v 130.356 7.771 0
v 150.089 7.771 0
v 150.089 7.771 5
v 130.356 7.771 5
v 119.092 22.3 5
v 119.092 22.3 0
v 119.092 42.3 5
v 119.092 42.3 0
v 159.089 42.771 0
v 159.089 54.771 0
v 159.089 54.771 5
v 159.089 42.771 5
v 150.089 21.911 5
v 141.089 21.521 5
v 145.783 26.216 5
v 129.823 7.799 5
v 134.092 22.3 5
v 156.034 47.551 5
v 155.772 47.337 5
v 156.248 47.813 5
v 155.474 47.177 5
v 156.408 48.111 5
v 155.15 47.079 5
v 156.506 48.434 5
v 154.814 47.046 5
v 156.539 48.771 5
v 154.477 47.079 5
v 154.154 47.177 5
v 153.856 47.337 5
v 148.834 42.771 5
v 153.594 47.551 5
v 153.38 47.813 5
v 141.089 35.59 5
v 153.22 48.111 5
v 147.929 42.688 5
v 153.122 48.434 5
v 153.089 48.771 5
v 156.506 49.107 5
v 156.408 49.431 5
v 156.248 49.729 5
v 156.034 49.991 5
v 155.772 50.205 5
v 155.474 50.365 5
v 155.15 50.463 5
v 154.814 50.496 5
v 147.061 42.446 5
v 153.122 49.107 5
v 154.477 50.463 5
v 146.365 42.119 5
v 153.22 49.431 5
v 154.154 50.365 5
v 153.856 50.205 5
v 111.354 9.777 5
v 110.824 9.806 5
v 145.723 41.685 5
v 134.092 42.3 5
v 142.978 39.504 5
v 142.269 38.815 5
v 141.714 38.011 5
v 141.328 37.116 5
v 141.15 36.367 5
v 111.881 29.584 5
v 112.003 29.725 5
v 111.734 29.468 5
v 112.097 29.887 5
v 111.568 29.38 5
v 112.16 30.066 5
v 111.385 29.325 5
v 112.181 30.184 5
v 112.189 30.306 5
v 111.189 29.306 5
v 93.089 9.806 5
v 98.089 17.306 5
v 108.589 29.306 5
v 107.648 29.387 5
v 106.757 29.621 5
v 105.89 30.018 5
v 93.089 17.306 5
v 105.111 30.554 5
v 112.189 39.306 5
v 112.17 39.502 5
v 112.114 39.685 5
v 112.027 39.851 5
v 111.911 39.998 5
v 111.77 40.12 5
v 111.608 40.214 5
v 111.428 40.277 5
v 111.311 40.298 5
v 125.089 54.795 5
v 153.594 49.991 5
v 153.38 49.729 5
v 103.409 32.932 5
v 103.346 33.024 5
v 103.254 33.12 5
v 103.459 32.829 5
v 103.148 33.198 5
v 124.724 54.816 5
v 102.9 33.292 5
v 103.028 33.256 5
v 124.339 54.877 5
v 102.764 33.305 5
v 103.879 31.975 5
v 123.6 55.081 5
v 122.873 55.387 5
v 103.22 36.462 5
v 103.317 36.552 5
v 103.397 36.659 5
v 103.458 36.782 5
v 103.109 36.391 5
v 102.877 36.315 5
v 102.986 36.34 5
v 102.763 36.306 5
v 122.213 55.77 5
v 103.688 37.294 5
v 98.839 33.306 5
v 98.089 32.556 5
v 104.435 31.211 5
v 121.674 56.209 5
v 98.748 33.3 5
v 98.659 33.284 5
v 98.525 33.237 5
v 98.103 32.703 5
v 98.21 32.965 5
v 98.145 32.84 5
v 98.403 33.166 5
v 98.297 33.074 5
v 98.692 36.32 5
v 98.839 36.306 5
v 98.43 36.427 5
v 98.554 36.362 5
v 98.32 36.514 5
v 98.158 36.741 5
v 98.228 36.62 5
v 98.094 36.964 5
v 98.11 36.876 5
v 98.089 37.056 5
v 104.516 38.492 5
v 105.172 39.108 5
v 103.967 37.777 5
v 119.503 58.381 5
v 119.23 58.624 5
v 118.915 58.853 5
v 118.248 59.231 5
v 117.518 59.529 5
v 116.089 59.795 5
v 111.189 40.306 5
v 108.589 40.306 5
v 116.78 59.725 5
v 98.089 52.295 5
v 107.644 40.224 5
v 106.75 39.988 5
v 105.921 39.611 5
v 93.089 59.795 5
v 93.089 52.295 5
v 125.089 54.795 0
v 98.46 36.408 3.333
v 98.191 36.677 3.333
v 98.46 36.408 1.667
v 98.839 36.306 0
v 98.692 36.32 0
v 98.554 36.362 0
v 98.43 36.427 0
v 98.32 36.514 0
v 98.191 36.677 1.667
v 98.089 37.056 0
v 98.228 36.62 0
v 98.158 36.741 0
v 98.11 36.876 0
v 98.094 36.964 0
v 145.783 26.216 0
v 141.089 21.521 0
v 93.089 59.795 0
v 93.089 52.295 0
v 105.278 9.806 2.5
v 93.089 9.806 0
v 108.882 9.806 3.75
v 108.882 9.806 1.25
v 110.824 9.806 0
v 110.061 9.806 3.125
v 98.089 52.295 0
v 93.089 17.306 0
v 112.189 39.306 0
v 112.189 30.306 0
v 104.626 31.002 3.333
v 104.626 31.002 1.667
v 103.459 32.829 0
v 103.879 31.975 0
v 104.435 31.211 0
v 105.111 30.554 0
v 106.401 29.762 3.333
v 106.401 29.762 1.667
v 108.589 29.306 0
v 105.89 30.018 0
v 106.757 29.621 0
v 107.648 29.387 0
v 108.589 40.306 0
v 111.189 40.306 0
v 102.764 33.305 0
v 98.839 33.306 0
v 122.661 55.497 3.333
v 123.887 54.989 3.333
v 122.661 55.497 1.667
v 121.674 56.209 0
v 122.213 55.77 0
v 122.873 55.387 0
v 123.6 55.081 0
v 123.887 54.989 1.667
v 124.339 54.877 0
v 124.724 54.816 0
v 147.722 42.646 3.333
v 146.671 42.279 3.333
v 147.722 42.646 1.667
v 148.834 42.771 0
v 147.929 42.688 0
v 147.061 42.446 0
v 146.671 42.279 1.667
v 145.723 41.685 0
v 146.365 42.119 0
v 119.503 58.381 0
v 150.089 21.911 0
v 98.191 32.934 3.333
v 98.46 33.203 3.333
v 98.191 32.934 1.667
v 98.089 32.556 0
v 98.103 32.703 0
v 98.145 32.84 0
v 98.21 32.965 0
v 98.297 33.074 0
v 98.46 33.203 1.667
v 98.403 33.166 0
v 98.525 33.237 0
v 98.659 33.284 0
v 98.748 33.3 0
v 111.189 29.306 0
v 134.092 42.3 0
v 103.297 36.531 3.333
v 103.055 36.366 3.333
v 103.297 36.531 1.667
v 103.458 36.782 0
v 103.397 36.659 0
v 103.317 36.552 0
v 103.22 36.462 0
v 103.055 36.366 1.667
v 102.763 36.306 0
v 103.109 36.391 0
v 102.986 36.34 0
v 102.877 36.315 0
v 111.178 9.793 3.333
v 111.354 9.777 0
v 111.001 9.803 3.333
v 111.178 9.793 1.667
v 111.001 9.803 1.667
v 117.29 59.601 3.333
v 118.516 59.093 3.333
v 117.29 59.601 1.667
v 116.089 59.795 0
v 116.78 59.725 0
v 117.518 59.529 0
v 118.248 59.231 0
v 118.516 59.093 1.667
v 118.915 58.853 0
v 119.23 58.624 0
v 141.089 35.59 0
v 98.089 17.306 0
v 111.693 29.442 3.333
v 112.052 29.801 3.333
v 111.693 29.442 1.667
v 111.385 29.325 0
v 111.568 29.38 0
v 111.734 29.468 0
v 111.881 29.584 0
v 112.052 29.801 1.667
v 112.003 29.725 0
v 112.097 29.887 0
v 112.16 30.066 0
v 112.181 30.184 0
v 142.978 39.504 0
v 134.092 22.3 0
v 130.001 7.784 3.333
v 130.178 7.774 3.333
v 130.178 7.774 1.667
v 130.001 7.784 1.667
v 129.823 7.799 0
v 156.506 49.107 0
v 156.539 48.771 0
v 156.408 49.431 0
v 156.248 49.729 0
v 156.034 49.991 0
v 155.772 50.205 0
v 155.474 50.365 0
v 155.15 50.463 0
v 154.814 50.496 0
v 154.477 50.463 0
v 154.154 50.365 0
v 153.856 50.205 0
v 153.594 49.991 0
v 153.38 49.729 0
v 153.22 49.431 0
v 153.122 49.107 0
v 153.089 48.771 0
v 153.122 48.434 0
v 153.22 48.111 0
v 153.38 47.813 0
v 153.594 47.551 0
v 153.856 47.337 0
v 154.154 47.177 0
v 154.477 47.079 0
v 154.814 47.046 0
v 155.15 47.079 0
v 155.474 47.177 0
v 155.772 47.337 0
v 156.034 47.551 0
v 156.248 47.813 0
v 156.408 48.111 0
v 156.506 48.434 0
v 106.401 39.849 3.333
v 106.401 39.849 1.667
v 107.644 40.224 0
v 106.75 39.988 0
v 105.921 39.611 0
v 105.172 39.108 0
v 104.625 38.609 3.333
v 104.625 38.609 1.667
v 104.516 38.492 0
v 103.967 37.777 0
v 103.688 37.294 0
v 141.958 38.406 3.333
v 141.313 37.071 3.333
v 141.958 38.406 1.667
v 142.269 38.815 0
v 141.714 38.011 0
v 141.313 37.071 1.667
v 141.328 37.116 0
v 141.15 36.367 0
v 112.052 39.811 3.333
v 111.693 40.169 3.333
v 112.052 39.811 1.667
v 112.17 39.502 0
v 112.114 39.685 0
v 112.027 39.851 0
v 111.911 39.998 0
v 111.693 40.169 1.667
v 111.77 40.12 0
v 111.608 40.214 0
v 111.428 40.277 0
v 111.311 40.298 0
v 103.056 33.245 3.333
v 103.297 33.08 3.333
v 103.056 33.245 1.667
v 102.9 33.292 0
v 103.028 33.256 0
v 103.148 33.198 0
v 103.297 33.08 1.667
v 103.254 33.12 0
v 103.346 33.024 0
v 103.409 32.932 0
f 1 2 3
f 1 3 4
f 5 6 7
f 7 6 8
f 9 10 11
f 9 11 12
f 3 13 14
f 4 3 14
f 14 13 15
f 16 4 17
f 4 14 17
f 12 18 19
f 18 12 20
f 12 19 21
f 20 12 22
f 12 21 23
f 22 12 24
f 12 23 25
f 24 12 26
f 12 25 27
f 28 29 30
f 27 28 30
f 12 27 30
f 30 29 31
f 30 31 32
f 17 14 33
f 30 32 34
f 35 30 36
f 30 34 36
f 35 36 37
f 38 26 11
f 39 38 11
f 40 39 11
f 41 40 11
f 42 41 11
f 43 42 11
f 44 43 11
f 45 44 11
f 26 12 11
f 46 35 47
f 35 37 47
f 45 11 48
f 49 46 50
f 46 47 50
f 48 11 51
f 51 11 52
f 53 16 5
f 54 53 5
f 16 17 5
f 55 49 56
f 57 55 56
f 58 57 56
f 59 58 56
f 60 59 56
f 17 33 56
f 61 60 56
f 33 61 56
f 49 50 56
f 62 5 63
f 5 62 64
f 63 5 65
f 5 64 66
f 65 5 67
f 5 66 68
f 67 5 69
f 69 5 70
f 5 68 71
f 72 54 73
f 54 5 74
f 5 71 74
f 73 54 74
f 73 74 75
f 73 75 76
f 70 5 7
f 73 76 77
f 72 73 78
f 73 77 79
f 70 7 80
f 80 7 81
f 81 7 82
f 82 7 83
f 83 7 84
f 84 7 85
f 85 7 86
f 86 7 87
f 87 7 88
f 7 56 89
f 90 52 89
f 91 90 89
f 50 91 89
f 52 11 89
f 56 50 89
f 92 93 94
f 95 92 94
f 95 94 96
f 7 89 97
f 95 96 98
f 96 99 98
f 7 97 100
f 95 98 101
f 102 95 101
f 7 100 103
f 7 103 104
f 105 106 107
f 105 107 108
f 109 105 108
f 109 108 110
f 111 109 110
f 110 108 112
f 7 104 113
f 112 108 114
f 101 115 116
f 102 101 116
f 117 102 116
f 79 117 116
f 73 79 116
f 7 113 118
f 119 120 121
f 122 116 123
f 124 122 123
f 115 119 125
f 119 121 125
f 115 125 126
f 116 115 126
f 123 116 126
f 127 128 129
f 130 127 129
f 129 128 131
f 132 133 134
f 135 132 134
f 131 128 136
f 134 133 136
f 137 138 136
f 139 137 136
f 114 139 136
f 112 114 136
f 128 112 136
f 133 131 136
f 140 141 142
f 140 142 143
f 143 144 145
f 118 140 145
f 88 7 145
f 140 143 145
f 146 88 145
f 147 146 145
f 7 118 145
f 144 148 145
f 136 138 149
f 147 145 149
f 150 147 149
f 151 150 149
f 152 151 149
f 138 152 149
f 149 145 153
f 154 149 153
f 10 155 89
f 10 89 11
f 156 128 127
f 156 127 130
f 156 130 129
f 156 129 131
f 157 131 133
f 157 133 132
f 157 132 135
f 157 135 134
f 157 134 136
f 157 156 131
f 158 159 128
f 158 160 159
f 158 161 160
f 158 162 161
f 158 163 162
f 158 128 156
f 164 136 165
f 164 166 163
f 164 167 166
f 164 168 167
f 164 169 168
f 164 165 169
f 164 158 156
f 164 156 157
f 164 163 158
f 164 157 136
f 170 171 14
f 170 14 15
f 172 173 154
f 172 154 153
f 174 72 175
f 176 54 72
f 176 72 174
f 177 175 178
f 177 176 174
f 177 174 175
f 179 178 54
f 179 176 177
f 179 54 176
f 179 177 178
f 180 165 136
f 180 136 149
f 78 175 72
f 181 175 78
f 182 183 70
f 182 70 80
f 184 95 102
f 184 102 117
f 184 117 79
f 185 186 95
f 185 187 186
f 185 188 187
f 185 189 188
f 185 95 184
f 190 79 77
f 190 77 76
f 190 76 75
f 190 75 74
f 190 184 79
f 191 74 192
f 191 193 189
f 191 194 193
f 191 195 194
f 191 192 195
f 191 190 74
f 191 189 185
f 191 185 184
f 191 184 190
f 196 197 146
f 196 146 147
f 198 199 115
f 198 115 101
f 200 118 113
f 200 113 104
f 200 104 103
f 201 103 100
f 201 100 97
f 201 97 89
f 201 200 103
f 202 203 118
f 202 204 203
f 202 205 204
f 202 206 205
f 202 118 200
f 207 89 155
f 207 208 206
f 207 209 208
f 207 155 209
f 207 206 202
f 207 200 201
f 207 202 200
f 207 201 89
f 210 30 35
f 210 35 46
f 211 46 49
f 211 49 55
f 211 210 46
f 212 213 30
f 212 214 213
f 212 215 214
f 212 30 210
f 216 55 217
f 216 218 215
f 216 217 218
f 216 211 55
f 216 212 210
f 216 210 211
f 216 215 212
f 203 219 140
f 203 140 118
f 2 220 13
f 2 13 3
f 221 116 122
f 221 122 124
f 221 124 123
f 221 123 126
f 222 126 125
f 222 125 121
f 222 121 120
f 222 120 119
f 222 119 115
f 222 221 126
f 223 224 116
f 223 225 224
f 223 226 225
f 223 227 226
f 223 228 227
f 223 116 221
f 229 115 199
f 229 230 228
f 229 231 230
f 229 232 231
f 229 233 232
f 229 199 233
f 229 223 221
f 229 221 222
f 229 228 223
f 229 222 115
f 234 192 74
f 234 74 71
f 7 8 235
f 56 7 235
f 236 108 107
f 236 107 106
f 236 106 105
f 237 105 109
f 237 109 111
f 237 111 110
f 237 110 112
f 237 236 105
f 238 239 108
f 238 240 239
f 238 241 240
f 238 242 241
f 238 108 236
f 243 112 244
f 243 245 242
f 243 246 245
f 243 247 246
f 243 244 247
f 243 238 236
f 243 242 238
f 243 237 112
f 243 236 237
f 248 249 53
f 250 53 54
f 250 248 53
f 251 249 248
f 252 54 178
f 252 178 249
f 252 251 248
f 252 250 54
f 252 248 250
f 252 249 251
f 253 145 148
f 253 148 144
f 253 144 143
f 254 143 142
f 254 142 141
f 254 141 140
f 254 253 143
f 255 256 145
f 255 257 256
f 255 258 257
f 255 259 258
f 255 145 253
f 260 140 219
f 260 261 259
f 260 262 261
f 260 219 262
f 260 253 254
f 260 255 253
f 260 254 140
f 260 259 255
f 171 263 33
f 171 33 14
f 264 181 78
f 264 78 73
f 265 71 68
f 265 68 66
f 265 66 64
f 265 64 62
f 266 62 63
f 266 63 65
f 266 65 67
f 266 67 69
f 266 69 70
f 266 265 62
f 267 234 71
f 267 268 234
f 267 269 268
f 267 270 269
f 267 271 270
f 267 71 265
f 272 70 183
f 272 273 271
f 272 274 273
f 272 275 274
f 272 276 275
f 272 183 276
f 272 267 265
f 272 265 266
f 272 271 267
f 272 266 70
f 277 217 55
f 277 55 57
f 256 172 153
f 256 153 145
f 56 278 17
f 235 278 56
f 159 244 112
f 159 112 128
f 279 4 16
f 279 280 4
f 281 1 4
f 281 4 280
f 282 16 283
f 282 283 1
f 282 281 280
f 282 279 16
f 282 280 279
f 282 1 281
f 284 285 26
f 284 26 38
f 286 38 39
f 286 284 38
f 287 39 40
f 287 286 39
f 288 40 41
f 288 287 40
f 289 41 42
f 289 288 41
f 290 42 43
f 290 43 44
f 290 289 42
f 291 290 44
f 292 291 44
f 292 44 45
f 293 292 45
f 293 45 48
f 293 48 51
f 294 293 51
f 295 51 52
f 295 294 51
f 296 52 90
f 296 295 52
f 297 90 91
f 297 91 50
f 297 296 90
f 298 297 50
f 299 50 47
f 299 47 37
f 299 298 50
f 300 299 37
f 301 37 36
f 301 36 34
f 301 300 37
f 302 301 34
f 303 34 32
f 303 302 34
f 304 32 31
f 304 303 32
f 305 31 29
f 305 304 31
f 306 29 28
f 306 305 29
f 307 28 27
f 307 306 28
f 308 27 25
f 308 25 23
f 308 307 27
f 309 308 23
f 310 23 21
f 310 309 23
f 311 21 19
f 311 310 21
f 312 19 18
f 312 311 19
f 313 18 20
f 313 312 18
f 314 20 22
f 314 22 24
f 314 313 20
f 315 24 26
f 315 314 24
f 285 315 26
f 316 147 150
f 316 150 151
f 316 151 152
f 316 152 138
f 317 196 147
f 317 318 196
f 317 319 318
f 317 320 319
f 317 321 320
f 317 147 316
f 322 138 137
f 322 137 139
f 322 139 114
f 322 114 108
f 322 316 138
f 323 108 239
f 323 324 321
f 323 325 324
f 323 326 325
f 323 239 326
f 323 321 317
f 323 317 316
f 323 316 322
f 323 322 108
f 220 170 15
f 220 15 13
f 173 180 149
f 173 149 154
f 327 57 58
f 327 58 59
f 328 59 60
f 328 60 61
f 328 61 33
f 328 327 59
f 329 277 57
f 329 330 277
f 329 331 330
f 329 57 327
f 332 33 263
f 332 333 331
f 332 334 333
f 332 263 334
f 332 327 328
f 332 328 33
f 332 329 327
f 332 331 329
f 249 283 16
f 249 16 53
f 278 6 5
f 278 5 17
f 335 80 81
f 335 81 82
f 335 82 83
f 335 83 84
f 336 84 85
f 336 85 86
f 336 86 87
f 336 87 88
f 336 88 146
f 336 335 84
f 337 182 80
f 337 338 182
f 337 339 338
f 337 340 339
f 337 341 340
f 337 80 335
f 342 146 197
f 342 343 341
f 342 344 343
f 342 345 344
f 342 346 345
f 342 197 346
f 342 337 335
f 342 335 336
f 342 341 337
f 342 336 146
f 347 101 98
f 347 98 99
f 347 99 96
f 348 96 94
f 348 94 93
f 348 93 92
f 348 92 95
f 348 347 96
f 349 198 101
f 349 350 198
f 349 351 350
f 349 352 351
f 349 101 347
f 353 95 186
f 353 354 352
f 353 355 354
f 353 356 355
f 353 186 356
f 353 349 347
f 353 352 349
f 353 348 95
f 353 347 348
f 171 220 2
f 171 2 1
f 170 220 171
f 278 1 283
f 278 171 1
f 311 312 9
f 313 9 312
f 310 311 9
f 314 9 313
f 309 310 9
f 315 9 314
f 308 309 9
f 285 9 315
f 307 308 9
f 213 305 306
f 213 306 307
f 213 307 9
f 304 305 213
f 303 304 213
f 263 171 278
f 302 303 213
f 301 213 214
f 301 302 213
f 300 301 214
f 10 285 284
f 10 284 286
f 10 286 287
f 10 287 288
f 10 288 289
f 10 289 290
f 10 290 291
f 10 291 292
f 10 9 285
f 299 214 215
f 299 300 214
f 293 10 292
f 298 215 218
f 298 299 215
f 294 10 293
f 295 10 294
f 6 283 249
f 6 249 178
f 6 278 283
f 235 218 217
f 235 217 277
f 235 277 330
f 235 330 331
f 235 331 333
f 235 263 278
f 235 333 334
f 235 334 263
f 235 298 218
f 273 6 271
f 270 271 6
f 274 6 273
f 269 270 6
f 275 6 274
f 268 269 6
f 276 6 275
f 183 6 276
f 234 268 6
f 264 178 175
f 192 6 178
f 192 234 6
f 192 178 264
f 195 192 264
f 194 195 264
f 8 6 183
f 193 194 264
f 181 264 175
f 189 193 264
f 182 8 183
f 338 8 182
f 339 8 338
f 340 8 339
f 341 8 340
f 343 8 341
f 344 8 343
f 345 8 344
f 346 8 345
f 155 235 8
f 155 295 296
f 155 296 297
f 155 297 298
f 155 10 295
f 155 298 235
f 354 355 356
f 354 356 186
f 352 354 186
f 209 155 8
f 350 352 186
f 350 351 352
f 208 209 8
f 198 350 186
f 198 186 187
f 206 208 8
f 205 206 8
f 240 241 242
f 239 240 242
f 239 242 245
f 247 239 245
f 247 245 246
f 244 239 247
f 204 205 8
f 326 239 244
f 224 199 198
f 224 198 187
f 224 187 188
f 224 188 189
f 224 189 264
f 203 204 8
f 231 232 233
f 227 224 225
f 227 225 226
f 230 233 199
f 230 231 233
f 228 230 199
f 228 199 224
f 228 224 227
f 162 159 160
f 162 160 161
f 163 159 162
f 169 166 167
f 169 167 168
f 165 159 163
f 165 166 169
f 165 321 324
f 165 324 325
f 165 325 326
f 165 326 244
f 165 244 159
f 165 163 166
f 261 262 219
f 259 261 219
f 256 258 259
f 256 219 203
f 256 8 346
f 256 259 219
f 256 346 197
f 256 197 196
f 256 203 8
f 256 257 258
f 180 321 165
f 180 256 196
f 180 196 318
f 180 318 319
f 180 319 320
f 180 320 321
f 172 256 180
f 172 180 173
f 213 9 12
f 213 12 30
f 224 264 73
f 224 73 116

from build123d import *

# Parameters (mm, degrees)
MODEL_4_W           = 14.999999996
MODEL_4_H           = 19.999999994
MODEL_4_R           = 1.725
BOSS_EXTRUDE3_DEPTH = 5


with BuildPart() as part:
    # Model<4> → Boss-Extrude3 (new body)
    with BuildSketch(Plane.XY):
        with BuildLine():
            Line((159.088901233, 42.770886007), (159.088901233, 54.770886004))
            Line((159.088901233, 54.770886004), (125.08858378, 54.795139347))
            add(Edge.make_bspline(
                [(121.67437012, 56.209353091), (122.452187569, 55.431535532), (123.988583716, 54.795139347), (125.08858378, 54.795139347)],
                knots=[36, 36, 36, 36, 37, 37, 37, 37], degree=3))
            Line((121.67437012, 56.209353091), (119.502797904, 58.380925601))
            add(Edge.make_bspline(
                [(116.088583489, 59.795139659), (117.188583796, 59.795139659), (118.724980283, 59.158743333), (119.502797904, 58.380925601)],
                knots=[34, 34, 34, 34, 35, 35, 35, 35], degree=3))
            Line((116.088583489, 59.795139659), (93.088622023, 59.795139659))
            Line((93.088622023, 59.795139659), (93.088622023, 52.295139183))
            Line((93.088622023, 52.295139183), (98.088808744, 52.295139183))
            Line((98.088808744, 52.295139183), (98.088808744, 37.055828853))
            add(Edge.make_bspline(
                [(98.838842522, 36.30582961), (98.424615889, 36.305810532), (98.088808739, 36.64160222), (98.088808744, 37.055828853)],
                knots=[29, 29, 29, 29, 30, 30, 30, 30], degree=3))
            Line((98.838842522, 36.30582961), (102.763213768, 36.306010412))
            add(Edge.make_bspline(
                [(103.458228599, 36.781634874), (103.346863397, 36.494660115), (103.071039563, 36.306024593), (102.763213768, 36.306010412)],
                knots=[27, 27, 27, 27, 28, 28, 28, 28], degree=3))
            add(Edge.make_bspline(
                [(108.589100574, 40.305794491), (106.259590893, 40.305794491), (104.256249253, 38.838038305), (103.458228599, 36.781634874)],
                knots=[26, 26, 26, 26, 27, 27, 27, 27], degree=3))
            Line((108.589100574, 40.305794491), (111.188773507, 40.305794491))
            add(Edge.make_bspline(
                [(112.188773507, 39.305794492), (112.188773506, 39.858079241), (111.741058256, 40.305794491), (111.188773507, 40.305794491)],
                knots=[24, 24, 24, 24, 25, 25, 25, 25], degree=3))
            Line((112.188773507, 39.305794492), (112.188773507, 30.305794494))
            add(Edge.make_bspline(
                [(111.188773507, 29.305794495), (111.741058256, 29.305794495), (112.188773507, 29.753509745), (112.188773507, 30.305794494)],
                knots=[22, 22, 22, 22, 23, 23, 23, 23], degree=3))
            Line((111.188773507, 29.305794495), (108.589100574, 29.305794495))
            add(Edge.make_bspline(
                [(103.458534777, 32.829165314), (104.256761577, 30.773175353), (106.259888758, 29.305794495), (108.589100574, 29.305794495)],
                knots=[20, 20, 20, 20, 21, 21, 21, 21], degree=3))
            add(Edge.make_bspline(
                [(102.763713878, 33.304665432), (103.071437534, 33.304591066), (103.347162069, 33.116027604), (103.458534777, 32.829165314)],
                knots=[19, 19, 19, 19, 20, 20, 20, 20], degree=3))
            Line((102.763713878, 33.304665432), (98.838989216, 33.305613899))
            add(Edge.make_bspline(
                [(98.088808744, 32.555614676), (98.088808739, 32.969898599), (98.424705306, 33.30571401), (98.838989216, 33.305613899)],
                knots=[17, 17, 17, 17, 18, 18, 18, 18], degree=3))
            Line((98.088808744, 32.555614676), (98.088808744, 17.30579417))
            Line((98.088808744, 17.30579417), (93.088622023, 17.30579417))
            Line((93.088622023, 17.30579417), (93.088622023, 9.805793695))
            add(Edge.make_bspline(
                [(110.8243856, 9.805786903), (108.600397254, 9.805793694), (93.088622023, 9.805793695)],
                knots=[13, 13, 13, 14, 14, 14], degree=2))
            add(Edge.make_bspline(
                [(111.354083681, 9.777355295), (111.177236079, 9.796295653), (111.002244565, 9.80578636), (110.8243856, 9.805786903)],
                knots=[12, 12, 12, 12, 13, 13, 13, 13], degree=3))
            Line((111.354083681, 9.777355295), (129.823433077, 7.799317277))
            add(Edge.make_bspline(
                [(130.355887494, 7.770885671), (130.178023326, 7.770885671), (130.000285852, 7.780376365), (129.823433077, 7.799317277)],
                knots=[10, 10, 10, 10, 11, 11, 11, 11], degree=3))
            Line((130.355887494, 7.770885671), (150.088901196, 7.770885671))
            Line((150.088901196, 7.770885671), (150.088901196, 21.91055044))
            Line((150.088901196, 21.91055044), (145.783498532, 26.215953035))
            Line((145.783498532, 26.215953035), (141.088901059, 21.521355488))
            Line((141.088901059, 21.521355488), (141.088901059, 35.589646165))
            add(Edge.make_bspline(
                [(142.978129629, 39.504119451), (141.78451535, 38.555572629), (141.088901059, 37.114262879), (141.088901059, 35.589646165)],
                knots=[4, 4, 4, 4, 5, 5, 5, 5], degree=3))
            Line((142.978129629, 39.504119451), (145.722916781, 41.685359384))
            add(Edge.make_bspline(
                [(148.833688241, 42.770886007), (147.703902982, 42.770886039), (146.607419644, 42.388260099), (145.722916781, 41.685359384)],
                knots=[2, 2, 2, 2, 3, 3, 3, 3], degree=3))
            Line((148.833688241, 42.770886007), (159.088901233, 42.770886007))
        make_face()
        with Locations((126.592244968, 32.300466217)):
            Rectangle(MODEL_4_W, MODEL_4_H, mode=Mode.SUBTRACT)
        with Locations((154.813901136, 48.770885771)):
            Circle(MODEL_4_R, mode=Mode.SUBTRACT)
    extrude(amount=BOSS_EXTRUDE3_DEPTH)


solid = part.part
